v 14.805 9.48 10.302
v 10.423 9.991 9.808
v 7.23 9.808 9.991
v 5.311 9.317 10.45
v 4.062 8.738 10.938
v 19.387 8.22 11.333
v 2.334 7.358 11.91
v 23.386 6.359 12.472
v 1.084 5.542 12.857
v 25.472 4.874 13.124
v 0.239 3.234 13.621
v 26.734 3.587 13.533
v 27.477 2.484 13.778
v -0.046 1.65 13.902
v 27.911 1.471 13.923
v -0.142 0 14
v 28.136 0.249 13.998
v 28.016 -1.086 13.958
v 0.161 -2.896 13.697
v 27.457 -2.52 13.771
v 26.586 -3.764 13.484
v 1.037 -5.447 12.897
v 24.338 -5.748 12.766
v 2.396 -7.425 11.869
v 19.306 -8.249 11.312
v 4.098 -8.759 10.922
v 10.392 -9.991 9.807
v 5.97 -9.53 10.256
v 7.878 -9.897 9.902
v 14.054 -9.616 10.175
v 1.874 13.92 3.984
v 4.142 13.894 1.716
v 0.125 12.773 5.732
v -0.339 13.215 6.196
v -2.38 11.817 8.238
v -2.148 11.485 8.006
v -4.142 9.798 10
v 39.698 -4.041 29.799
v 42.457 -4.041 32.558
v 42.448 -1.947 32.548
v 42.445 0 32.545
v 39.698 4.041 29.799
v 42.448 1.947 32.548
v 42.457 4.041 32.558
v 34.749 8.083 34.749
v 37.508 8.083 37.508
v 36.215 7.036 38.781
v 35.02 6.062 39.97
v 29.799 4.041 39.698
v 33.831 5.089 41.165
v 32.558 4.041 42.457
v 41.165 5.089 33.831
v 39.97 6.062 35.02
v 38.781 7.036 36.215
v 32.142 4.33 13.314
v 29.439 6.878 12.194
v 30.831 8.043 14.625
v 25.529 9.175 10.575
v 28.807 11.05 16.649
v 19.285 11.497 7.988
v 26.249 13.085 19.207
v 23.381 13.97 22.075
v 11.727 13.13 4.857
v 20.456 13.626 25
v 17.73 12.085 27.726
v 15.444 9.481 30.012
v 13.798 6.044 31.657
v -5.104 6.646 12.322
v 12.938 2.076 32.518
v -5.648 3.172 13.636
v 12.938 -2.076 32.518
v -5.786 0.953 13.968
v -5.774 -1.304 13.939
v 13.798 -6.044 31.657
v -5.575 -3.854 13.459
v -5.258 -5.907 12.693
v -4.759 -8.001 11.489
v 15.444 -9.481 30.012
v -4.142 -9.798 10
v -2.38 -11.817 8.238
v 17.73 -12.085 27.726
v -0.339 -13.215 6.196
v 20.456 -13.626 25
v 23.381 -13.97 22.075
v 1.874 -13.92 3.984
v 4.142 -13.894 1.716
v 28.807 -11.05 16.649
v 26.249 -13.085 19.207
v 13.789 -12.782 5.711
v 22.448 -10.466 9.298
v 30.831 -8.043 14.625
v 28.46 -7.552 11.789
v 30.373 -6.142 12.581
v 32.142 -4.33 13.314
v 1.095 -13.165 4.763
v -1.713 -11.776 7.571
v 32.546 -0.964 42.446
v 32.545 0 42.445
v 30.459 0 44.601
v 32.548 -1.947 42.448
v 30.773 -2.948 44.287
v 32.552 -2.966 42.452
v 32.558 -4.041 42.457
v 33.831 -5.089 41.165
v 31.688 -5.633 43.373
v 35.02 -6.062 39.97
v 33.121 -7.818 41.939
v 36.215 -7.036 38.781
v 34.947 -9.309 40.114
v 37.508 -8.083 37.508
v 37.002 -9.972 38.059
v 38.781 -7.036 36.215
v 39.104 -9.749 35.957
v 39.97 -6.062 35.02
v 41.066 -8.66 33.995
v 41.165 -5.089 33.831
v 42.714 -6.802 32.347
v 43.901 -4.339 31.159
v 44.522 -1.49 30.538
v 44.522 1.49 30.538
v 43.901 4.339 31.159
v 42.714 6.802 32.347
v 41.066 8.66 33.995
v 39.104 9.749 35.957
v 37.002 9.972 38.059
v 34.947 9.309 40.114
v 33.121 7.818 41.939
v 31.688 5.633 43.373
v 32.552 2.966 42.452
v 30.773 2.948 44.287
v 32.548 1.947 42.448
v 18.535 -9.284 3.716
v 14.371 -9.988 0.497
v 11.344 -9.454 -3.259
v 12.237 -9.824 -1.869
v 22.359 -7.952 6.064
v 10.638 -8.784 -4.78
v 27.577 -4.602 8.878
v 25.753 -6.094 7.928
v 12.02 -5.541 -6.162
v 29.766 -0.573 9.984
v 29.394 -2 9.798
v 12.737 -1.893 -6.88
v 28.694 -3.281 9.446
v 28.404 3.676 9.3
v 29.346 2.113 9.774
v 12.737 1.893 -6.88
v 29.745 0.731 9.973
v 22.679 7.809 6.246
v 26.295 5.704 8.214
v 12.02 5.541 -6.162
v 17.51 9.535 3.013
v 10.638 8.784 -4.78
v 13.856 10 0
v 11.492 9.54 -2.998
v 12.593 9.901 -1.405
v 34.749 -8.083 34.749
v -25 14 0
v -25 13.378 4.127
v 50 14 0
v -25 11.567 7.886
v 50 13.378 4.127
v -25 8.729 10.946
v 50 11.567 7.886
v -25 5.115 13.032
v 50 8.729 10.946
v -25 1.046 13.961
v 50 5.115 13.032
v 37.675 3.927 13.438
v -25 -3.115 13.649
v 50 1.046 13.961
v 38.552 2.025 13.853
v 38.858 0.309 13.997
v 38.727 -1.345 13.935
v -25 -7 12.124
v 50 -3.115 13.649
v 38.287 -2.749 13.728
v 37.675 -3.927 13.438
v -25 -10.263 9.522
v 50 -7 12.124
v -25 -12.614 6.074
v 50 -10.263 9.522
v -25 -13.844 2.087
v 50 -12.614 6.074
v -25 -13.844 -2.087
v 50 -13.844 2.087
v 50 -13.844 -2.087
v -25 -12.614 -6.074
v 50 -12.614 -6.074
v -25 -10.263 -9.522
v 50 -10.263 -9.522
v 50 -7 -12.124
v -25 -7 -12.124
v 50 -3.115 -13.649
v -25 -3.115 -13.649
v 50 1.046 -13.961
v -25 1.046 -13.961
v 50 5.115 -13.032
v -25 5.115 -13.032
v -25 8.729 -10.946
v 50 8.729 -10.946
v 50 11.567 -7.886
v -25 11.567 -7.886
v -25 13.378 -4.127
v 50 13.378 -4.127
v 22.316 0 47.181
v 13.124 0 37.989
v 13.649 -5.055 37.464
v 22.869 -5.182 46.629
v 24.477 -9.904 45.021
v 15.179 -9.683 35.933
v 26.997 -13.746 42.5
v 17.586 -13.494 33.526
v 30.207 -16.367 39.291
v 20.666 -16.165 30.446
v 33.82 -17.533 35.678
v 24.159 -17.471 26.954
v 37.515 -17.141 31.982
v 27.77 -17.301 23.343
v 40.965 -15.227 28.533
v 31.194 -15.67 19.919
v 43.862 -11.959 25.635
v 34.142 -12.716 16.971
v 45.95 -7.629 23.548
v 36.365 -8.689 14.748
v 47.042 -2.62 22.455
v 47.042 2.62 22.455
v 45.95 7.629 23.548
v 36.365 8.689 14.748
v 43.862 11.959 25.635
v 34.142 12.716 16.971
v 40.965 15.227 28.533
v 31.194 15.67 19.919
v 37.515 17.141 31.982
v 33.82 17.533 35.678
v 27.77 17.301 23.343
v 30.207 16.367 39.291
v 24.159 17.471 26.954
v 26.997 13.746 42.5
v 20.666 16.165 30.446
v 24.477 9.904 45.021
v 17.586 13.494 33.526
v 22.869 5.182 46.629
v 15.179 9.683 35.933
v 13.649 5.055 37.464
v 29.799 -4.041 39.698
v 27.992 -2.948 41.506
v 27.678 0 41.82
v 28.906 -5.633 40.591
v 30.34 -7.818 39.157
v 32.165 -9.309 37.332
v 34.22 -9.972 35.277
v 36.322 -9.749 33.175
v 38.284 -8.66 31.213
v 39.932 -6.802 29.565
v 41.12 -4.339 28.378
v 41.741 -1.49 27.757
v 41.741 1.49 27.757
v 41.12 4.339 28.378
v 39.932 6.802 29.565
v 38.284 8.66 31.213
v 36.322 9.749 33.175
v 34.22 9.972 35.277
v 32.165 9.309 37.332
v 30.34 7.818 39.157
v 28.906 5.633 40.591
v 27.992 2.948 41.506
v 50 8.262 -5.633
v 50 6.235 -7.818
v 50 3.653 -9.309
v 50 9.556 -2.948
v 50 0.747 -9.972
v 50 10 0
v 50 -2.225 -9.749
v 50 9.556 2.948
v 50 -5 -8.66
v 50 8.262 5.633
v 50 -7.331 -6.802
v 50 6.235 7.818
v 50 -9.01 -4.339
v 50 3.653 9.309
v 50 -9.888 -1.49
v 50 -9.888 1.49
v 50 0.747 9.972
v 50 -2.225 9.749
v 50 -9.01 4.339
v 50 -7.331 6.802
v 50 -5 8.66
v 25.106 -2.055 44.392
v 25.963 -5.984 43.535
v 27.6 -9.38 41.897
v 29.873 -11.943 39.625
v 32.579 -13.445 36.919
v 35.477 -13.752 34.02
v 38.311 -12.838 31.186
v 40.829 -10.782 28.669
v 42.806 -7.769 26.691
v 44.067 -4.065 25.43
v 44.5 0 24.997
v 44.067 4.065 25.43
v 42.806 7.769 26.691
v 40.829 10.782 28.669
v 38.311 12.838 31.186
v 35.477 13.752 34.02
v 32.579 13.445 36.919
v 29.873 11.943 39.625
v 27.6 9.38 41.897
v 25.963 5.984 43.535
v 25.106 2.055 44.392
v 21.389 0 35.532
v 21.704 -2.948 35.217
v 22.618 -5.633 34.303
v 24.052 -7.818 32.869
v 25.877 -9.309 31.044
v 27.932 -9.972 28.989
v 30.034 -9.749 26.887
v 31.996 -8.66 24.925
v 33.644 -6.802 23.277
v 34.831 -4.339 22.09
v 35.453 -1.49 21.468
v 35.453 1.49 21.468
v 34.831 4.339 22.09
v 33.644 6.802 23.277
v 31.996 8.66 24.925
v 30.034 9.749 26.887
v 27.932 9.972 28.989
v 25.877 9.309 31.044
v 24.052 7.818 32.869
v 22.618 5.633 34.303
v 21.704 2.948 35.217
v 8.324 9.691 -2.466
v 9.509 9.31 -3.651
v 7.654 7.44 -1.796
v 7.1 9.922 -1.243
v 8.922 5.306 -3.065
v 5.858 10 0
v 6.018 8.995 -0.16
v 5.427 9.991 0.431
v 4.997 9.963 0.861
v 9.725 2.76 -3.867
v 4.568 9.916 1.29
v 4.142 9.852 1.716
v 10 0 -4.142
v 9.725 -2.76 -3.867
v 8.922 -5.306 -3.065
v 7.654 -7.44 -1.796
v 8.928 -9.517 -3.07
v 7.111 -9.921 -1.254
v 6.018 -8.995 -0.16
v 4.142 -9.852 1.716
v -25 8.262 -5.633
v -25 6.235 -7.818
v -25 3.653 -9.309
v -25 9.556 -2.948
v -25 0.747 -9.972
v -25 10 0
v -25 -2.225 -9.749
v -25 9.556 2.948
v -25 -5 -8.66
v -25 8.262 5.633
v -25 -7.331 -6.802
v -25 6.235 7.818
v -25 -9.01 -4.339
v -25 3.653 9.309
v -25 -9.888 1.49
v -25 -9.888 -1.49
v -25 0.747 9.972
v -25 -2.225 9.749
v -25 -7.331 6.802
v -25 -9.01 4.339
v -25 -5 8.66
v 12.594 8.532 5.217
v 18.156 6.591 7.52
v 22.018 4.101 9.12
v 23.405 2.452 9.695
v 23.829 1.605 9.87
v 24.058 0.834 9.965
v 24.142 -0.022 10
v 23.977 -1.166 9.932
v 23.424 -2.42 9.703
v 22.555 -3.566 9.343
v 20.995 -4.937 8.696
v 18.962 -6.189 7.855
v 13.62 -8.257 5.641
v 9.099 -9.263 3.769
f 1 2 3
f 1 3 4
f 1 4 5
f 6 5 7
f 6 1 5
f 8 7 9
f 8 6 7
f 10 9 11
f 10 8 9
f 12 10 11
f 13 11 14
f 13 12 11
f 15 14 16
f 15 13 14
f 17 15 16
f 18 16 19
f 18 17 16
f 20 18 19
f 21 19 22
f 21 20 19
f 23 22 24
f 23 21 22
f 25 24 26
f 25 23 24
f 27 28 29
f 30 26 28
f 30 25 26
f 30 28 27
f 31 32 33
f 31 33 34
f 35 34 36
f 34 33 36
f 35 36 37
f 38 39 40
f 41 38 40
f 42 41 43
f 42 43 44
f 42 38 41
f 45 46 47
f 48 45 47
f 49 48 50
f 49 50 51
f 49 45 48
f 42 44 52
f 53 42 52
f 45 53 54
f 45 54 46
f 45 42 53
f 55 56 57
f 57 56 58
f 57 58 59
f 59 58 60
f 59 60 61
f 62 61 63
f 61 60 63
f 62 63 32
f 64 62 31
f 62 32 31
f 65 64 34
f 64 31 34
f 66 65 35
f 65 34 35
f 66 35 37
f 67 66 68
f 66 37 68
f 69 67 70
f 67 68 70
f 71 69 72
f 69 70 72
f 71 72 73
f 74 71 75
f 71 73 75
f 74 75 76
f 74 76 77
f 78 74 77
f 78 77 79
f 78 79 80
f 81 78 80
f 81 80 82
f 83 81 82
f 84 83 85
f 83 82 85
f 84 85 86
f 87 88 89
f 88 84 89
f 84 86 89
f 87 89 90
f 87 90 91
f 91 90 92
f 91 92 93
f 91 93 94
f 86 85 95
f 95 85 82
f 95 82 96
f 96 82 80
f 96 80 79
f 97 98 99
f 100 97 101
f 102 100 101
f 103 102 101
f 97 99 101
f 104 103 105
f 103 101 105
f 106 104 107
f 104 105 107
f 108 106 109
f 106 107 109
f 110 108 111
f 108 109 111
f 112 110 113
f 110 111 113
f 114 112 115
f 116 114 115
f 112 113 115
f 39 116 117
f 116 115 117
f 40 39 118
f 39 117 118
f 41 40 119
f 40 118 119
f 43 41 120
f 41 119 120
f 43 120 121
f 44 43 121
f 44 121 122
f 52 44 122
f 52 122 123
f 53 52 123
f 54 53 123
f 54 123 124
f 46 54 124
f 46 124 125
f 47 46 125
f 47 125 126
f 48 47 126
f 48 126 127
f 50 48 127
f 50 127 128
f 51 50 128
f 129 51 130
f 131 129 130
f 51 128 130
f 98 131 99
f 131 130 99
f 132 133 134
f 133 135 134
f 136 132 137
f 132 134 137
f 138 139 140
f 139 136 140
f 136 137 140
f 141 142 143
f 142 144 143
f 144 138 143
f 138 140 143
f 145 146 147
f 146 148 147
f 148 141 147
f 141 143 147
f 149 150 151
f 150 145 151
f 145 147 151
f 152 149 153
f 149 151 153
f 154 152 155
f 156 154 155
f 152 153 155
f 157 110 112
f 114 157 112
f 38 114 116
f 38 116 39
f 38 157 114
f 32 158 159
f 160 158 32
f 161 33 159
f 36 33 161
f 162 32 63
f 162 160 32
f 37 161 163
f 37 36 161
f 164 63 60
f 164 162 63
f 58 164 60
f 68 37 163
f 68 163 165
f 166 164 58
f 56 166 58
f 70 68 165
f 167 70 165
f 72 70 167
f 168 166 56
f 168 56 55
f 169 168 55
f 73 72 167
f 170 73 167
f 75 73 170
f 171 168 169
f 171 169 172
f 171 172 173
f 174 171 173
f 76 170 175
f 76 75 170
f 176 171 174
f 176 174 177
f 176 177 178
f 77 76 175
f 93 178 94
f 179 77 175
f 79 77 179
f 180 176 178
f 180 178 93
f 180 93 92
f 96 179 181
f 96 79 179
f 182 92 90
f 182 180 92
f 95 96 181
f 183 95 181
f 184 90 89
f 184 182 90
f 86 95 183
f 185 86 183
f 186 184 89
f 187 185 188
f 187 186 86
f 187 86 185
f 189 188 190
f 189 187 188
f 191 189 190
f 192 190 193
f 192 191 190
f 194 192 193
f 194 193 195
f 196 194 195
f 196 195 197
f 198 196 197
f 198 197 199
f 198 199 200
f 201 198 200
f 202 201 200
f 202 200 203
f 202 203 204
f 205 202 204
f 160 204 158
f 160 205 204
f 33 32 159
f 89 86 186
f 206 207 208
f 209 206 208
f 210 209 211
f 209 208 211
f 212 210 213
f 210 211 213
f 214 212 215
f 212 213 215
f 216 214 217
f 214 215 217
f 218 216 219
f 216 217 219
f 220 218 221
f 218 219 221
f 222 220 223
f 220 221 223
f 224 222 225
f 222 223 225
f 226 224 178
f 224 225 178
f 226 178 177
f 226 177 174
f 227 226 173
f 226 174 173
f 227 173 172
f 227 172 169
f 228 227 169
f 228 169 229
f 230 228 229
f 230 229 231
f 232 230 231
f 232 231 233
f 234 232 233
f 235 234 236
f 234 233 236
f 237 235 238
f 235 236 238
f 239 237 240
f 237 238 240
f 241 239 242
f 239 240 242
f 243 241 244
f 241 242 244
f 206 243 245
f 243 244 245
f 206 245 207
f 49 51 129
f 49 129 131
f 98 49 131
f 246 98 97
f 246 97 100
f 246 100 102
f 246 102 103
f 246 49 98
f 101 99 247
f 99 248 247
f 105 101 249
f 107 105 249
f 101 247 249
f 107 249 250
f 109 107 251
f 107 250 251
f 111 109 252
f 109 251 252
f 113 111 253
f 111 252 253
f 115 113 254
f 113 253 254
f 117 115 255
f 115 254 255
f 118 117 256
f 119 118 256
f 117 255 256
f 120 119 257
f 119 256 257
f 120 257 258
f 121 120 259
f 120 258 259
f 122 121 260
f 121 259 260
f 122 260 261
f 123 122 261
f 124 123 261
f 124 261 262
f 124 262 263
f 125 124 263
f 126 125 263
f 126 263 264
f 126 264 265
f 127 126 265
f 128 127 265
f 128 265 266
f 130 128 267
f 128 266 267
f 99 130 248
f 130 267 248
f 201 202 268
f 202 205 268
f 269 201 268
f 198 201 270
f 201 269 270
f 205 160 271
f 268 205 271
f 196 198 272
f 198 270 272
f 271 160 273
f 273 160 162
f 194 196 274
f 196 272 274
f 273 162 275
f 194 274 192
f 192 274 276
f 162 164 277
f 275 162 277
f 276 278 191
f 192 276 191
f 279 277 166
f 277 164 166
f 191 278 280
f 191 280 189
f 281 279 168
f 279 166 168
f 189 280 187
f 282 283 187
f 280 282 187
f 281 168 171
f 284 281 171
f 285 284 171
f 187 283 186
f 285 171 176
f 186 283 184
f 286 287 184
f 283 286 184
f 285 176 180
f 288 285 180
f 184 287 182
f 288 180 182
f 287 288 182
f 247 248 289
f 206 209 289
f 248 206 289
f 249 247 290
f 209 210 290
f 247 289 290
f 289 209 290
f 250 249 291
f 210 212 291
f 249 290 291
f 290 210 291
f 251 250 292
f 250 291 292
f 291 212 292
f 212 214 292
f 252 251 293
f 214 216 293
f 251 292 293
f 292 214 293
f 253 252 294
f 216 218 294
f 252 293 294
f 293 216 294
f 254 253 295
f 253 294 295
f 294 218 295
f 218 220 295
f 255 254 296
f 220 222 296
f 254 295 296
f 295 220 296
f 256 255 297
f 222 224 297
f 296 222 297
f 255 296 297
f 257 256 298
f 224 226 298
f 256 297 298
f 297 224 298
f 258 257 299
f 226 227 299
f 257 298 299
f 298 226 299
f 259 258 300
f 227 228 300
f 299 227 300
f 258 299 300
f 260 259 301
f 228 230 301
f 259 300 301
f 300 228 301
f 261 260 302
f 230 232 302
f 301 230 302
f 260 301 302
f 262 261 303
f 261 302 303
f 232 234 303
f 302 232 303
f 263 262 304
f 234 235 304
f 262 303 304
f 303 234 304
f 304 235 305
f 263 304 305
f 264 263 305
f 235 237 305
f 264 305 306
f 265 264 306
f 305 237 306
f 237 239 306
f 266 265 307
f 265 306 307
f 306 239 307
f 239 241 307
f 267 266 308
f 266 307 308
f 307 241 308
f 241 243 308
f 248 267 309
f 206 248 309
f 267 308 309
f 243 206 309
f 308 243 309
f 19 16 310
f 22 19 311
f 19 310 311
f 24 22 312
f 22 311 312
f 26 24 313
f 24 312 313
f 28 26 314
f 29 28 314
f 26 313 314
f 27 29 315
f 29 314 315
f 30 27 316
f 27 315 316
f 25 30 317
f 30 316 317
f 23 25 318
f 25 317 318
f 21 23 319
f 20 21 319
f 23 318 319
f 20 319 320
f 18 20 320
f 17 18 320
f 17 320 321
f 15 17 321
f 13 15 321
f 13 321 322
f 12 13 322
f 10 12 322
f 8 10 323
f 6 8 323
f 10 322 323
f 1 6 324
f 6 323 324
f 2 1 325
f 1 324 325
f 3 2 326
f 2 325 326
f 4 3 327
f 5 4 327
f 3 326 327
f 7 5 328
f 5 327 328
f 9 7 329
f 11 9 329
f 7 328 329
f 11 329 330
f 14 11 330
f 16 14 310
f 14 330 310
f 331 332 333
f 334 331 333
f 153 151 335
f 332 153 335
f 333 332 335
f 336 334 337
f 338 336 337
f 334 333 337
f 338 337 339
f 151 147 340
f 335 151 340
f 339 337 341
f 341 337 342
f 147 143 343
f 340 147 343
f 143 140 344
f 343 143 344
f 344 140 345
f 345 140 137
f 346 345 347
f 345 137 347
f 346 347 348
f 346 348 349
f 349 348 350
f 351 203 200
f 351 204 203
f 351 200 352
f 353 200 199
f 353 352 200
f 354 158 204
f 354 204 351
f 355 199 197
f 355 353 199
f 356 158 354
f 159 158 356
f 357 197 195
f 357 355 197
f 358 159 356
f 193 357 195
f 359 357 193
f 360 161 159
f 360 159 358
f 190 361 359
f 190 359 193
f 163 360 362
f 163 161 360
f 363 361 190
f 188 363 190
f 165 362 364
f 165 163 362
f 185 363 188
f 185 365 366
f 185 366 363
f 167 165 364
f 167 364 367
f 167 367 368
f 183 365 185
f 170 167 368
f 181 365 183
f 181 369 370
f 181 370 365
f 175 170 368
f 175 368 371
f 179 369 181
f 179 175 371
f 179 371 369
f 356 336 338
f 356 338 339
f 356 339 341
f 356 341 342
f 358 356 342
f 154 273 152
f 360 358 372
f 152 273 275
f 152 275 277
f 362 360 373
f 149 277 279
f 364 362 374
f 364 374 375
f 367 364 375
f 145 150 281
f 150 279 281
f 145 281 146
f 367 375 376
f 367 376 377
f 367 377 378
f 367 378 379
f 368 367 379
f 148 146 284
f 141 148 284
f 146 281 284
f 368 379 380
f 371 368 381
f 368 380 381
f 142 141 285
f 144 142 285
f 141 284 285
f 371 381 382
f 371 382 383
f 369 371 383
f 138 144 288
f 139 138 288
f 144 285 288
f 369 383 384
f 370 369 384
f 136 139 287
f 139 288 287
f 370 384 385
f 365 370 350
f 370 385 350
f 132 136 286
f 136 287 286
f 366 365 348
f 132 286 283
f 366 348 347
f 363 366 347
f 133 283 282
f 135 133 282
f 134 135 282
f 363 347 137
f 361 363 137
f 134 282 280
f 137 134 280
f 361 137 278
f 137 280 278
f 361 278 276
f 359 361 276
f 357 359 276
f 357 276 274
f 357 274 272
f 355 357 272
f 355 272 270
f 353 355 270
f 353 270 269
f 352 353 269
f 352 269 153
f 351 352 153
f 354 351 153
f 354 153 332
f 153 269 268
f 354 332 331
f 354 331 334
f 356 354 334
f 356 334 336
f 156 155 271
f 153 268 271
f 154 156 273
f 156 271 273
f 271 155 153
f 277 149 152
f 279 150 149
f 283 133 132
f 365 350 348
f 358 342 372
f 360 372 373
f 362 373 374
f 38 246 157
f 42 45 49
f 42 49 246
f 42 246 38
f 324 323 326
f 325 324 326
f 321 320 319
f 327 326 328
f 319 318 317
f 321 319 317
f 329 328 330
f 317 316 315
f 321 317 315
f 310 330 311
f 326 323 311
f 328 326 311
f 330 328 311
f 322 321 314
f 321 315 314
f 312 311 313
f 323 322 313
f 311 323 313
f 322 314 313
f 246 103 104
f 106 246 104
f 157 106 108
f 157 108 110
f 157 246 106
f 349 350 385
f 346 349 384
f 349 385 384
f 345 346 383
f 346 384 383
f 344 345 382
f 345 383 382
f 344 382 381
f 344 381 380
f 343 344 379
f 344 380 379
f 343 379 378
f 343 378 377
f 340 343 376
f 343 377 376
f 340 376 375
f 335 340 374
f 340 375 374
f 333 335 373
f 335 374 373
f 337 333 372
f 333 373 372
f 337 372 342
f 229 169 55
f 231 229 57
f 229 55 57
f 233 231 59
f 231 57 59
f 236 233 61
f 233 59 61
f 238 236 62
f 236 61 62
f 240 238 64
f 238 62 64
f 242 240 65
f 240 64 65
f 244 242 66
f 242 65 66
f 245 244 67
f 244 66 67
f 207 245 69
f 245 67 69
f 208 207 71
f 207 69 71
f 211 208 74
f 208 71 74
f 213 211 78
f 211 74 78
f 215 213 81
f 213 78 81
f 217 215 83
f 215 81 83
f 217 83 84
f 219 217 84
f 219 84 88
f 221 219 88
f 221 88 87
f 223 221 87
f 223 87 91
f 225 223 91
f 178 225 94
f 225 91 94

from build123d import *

# Parameters (mm, degrees)
F0_W     = 75
F0_H     = 4
F5_DEPTH = 25


with BuildPart() as f1:
    # F0 (on Top) → F1 (revolve)
    with BuildSketch(Plane.XY):
        with Locations((12.5, 12)):
            Rectangle(F0_W, F0_H)
    revolve(axis=Axis((-0.954778, 0, 0), (1, 0, 0)))

    # F2 (on Front) → F3 (revolve)
    with BuildSketch(Plane.XZ):
        Polygon((-6.970563, 12.828427), (-4.142136, 10), (21.389404, 35.53154), (28.460472, 28.460472), (37.413038, 37.413038), (30.45914, 44.601276), (27.67767, 41.819805), (22.316322, 47.181152), (13.123934, 37.988764), (12.828427, 32.627416), align=None)
    revolve(axis=Axis((18.706519, 0, 18.706519), (0.707107, 0, 0.707107)))

    # F4 (on face) → F5 (cut)
    with BuildSketch(Plane(origin=(34.748737, 0, 34.748737), x_dir=(0.707107, 0, -0.707107), z_dir=(0.707107, 0, 0.707107))):
        Polygon((7, -4.041452), (7, 4.041452), (0, 8.082904), (-7, 4.041452), (-7, -4.041452), (0, -8.082904), align=None)
    extrude(amount=F5_DEPTH, mode=Mode.SUBTRACT)


solid = f1.part
